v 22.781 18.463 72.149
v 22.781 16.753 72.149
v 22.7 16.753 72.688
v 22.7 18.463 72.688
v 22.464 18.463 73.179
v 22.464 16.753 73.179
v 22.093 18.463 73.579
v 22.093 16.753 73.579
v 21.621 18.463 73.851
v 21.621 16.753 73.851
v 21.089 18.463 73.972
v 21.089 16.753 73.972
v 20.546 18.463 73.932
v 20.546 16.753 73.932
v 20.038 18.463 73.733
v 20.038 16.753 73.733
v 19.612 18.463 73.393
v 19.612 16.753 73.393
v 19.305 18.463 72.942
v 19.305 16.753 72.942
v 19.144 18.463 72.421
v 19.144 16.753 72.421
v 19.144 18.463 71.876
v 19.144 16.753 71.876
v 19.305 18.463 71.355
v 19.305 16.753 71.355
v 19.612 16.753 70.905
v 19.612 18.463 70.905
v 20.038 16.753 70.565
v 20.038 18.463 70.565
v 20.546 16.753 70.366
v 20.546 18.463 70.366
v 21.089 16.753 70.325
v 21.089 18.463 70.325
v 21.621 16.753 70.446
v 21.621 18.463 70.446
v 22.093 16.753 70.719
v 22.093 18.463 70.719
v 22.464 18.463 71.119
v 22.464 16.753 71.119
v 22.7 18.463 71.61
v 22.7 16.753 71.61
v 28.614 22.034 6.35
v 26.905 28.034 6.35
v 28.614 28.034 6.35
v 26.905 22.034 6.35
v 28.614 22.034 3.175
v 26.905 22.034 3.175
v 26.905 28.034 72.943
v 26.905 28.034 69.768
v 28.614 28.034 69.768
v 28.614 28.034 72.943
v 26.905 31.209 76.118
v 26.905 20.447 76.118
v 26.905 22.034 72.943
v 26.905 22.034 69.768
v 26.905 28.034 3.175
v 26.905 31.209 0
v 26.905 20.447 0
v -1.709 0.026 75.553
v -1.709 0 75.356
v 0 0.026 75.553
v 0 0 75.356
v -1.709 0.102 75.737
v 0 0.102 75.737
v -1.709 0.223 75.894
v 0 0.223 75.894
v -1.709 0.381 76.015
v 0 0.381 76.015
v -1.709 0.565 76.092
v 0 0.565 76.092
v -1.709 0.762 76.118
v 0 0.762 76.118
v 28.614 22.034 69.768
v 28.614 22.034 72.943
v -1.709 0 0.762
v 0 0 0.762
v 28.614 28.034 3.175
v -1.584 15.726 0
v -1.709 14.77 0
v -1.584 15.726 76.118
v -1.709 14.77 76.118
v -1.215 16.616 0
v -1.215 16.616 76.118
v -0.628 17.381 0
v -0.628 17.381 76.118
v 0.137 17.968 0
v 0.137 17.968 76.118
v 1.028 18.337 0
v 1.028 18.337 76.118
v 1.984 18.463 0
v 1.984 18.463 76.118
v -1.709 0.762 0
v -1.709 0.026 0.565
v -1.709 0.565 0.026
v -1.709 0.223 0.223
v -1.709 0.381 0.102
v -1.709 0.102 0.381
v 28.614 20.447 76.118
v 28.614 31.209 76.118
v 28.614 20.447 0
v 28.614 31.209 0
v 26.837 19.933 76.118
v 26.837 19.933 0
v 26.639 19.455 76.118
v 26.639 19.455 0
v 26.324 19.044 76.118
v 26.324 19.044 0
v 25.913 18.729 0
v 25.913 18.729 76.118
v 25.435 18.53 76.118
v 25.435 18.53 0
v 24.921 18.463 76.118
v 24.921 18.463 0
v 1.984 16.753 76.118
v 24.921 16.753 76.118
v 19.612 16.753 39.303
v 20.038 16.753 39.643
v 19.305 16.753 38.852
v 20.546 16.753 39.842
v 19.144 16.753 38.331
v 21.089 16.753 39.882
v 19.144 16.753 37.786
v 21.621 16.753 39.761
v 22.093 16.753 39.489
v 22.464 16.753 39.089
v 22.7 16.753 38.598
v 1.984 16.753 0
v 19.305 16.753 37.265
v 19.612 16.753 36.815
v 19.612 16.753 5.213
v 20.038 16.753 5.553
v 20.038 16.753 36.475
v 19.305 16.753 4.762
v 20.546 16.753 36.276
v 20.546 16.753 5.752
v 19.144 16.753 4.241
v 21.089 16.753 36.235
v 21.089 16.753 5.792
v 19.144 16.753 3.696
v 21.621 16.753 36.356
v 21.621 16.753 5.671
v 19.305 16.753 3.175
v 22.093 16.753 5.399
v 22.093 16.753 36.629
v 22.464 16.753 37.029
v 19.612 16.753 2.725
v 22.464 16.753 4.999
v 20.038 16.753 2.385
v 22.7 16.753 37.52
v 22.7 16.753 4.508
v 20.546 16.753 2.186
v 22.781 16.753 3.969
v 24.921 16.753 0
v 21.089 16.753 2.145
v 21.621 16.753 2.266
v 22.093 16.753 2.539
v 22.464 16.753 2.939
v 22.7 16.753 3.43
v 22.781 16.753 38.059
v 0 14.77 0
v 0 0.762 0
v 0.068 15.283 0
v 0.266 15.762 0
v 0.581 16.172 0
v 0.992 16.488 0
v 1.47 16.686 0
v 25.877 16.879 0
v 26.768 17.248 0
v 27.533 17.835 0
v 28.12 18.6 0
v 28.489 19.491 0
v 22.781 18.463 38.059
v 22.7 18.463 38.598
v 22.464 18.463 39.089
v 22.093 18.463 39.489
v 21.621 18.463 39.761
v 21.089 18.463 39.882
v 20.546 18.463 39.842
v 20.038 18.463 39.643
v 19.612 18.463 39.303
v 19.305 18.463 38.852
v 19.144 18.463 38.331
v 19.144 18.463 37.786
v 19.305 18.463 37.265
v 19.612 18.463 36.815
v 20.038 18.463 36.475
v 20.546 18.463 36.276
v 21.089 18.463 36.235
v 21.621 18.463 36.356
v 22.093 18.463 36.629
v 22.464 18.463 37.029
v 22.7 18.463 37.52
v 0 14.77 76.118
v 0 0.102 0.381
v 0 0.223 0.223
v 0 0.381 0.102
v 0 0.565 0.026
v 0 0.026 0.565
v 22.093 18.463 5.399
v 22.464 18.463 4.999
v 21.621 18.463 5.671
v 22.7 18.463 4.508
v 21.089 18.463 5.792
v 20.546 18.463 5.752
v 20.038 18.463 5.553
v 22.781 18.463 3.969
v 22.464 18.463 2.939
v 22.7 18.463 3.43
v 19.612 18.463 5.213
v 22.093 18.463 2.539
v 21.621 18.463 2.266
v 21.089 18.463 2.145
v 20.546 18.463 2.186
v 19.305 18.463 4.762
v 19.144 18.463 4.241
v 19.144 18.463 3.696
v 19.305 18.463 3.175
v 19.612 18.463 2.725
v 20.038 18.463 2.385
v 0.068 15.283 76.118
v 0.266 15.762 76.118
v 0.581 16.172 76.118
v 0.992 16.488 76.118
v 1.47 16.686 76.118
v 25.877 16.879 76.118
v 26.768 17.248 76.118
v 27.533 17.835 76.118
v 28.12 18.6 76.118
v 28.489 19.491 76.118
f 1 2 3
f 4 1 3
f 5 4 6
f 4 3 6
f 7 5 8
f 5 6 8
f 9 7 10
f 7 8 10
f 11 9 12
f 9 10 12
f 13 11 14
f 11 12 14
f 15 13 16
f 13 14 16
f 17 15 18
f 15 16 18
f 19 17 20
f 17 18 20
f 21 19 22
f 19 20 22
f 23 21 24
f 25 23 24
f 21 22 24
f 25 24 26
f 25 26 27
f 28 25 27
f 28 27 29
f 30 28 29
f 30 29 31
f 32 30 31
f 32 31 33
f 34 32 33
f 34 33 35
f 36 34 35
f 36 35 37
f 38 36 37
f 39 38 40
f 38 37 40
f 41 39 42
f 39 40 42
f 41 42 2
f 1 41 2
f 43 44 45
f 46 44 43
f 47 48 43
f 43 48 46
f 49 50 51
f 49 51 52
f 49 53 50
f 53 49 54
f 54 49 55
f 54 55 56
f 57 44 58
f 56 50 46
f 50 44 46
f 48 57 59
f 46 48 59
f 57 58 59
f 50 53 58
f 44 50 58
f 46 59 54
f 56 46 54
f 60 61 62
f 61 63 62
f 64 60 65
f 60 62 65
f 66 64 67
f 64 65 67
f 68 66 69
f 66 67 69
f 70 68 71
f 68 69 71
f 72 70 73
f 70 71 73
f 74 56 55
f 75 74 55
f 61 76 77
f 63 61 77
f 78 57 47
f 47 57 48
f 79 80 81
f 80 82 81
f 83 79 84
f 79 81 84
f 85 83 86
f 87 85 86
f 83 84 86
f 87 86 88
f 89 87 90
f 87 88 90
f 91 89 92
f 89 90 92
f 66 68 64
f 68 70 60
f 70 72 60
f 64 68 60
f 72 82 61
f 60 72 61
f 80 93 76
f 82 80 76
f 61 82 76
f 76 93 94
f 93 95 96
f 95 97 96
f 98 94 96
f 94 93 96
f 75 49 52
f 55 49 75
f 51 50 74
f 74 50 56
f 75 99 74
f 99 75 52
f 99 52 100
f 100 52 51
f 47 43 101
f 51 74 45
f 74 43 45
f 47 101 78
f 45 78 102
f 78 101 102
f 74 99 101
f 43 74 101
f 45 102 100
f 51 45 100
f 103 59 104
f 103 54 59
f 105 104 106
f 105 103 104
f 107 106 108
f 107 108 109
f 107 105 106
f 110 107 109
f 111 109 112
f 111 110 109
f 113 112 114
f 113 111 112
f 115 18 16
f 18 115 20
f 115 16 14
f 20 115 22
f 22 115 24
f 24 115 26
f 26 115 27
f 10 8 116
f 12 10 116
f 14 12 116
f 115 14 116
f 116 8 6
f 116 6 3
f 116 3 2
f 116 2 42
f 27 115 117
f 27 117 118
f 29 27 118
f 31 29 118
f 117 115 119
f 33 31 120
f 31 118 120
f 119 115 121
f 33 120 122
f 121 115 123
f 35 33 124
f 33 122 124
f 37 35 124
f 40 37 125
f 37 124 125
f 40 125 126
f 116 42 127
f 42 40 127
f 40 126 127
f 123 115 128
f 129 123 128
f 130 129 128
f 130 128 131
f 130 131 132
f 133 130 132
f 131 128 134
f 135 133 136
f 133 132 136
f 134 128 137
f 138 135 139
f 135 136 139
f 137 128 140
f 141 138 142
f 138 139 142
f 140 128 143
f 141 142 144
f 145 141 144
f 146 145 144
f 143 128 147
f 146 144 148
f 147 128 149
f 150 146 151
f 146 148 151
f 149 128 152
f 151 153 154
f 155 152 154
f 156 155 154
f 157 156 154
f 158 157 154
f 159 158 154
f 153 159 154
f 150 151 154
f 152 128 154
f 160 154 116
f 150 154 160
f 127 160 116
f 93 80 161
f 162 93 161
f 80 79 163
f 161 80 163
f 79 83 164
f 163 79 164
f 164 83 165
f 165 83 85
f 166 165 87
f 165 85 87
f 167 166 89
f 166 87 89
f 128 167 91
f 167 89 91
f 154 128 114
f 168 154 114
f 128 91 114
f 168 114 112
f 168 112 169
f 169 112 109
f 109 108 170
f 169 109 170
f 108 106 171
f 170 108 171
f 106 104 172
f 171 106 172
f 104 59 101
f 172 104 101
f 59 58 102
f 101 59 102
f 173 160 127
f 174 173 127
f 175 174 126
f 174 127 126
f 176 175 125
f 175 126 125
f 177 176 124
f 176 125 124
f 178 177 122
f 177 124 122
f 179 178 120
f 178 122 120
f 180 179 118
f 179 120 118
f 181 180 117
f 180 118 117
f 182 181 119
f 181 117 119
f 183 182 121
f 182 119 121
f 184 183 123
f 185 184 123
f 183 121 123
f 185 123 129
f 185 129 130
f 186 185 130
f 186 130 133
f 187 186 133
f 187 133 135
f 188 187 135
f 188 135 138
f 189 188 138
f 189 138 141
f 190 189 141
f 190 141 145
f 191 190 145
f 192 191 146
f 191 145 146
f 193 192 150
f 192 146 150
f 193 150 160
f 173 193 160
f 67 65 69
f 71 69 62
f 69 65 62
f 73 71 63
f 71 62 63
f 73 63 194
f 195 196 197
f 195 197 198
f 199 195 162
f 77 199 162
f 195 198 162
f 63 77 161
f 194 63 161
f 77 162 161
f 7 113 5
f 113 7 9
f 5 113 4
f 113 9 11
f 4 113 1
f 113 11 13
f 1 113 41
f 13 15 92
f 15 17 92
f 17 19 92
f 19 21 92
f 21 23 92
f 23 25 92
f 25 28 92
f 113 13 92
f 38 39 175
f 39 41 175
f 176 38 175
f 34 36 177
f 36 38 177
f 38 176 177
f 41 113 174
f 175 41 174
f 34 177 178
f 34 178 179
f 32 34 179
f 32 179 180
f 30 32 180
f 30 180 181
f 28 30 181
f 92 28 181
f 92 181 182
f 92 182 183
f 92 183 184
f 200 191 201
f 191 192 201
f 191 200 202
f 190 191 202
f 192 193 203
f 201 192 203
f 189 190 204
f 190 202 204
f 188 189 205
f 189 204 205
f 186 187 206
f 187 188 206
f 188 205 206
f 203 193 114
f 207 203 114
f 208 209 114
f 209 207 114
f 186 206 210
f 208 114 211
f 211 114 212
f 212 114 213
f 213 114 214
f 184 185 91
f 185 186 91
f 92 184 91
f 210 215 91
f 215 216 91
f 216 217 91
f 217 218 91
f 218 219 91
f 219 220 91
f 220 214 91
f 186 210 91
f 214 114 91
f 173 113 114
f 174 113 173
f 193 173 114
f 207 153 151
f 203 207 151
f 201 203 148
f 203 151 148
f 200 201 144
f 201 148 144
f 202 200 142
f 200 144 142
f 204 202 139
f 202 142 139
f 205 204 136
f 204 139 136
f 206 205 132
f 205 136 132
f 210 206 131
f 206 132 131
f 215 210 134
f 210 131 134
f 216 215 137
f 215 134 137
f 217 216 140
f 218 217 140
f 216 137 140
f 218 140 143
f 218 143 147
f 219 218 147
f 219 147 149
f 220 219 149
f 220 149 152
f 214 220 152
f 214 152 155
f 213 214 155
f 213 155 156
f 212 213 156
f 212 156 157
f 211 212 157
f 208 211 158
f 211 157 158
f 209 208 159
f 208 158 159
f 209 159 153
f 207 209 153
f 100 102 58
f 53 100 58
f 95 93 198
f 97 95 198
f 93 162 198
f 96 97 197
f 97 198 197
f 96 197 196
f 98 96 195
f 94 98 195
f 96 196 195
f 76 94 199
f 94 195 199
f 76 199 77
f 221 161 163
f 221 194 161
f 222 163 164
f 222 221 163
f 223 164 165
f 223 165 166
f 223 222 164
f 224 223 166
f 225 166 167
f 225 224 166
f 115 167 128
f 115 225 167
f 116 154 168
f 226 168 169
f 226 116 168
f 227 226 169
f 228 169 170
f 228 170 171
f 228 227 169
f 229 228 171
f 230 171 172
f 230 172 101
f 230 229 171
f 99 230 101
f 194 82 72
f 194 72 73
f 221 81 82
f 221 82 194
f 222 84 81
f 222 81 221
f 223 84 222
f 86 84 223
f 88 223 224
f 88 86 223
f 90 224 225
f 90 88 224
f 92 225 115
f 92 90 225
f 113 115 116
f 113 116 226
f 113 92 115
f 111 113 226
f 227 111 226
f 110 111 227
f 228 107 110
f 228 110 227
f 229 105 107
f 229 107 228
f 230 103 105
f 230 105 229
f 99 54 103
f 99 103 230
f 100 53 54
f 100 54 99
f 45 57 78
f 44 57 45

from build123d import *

# Parameters (mm, degrees)
F1_DEPTH = 76.1175008
F2_R     = 1.98374
F3_R     = 3.69316
F4_R     = 1.8288
F5_DEPTH = 1.70942
F6_R     = 0.762
F7_W     = 6
F7_H     = 3.175
F8_DEPTH = 1.70942


# Not quite as in the source:
# - a feature names something its author has since deleted; it is built from what else it names


with BuildPart() as f1:
    # F0 (on Top) → F1 (new body)
    with BuildSketch(Plane.XY):
        Polygon((-1.70942, 0), (0, 0), (0, 16.7533828), (28.6143954, 16.7533828), (28.6143954, 31.2090308), (26.9049754, 31.2090308), (26.9049754, 18.4628028), (-1.70942, 18.4628028), align=None)
    extrude(amount=F1_DEPTH)

    # F2
    f2_edges = [f1.edges().sort_by_distance(p)[0] for p in [
        (0, 16.753383, 38.05875),
        (26.904975, 18.462803, 38.05875),
    ]]
    fillet(f2_edges, radius=F2_R)

    # F3
    f3_edges = [f1.edges().sort_by_distance(p)[0] for p in [
        (-1.70942, 18.462803, 38.05875),
        (28.614395, 16.753383, 38.05875),
    ]]
    fillet(f3_edges, radius=F3_R)

    # F4 (on face) → F5 (cut, through all)
    with BuildSketch(Plane.XZ.offset(-16.7533828)):
        with Locations((20.9524854, 72.1487508)):
            Circle(F4_R)
        with Locations((20.9524854, 38.0587504)):
            Circle(F4_R)
        with Locations((20.9524854, 3.96875)):
            Circle(F4_R)
    extrude(amount=-F5_DEPTH, mode=Mode.SUBTRACT)

    # F6
    f6_edges = [f1.edges().sort_by_distance(p)[0] for p in [
        (-0.85471, 0, 76.117501),
        (-0.85471, 0, 0),
    ]]
    fillet(f6_edges, radius=F6_R)

    # F7 (on face) → F8 (cut, through all)
    with BuildSketch(Plane(origin=(26.9049754, 0, 0), x_dir=(0, -1, 0), z_dir=(-1, 0, 0))):
        with Locations((-25.0340308, 71.3550008)):
            Rectangle(F7_W, F7_H)
        with Locations((-25.0340308, 4.7625)):
            Rectangle(F7_W, F7_H)
    extrude(amount=-F8_DEPTH, mode=Mode.SUBTRACT)


solid = f1.part
